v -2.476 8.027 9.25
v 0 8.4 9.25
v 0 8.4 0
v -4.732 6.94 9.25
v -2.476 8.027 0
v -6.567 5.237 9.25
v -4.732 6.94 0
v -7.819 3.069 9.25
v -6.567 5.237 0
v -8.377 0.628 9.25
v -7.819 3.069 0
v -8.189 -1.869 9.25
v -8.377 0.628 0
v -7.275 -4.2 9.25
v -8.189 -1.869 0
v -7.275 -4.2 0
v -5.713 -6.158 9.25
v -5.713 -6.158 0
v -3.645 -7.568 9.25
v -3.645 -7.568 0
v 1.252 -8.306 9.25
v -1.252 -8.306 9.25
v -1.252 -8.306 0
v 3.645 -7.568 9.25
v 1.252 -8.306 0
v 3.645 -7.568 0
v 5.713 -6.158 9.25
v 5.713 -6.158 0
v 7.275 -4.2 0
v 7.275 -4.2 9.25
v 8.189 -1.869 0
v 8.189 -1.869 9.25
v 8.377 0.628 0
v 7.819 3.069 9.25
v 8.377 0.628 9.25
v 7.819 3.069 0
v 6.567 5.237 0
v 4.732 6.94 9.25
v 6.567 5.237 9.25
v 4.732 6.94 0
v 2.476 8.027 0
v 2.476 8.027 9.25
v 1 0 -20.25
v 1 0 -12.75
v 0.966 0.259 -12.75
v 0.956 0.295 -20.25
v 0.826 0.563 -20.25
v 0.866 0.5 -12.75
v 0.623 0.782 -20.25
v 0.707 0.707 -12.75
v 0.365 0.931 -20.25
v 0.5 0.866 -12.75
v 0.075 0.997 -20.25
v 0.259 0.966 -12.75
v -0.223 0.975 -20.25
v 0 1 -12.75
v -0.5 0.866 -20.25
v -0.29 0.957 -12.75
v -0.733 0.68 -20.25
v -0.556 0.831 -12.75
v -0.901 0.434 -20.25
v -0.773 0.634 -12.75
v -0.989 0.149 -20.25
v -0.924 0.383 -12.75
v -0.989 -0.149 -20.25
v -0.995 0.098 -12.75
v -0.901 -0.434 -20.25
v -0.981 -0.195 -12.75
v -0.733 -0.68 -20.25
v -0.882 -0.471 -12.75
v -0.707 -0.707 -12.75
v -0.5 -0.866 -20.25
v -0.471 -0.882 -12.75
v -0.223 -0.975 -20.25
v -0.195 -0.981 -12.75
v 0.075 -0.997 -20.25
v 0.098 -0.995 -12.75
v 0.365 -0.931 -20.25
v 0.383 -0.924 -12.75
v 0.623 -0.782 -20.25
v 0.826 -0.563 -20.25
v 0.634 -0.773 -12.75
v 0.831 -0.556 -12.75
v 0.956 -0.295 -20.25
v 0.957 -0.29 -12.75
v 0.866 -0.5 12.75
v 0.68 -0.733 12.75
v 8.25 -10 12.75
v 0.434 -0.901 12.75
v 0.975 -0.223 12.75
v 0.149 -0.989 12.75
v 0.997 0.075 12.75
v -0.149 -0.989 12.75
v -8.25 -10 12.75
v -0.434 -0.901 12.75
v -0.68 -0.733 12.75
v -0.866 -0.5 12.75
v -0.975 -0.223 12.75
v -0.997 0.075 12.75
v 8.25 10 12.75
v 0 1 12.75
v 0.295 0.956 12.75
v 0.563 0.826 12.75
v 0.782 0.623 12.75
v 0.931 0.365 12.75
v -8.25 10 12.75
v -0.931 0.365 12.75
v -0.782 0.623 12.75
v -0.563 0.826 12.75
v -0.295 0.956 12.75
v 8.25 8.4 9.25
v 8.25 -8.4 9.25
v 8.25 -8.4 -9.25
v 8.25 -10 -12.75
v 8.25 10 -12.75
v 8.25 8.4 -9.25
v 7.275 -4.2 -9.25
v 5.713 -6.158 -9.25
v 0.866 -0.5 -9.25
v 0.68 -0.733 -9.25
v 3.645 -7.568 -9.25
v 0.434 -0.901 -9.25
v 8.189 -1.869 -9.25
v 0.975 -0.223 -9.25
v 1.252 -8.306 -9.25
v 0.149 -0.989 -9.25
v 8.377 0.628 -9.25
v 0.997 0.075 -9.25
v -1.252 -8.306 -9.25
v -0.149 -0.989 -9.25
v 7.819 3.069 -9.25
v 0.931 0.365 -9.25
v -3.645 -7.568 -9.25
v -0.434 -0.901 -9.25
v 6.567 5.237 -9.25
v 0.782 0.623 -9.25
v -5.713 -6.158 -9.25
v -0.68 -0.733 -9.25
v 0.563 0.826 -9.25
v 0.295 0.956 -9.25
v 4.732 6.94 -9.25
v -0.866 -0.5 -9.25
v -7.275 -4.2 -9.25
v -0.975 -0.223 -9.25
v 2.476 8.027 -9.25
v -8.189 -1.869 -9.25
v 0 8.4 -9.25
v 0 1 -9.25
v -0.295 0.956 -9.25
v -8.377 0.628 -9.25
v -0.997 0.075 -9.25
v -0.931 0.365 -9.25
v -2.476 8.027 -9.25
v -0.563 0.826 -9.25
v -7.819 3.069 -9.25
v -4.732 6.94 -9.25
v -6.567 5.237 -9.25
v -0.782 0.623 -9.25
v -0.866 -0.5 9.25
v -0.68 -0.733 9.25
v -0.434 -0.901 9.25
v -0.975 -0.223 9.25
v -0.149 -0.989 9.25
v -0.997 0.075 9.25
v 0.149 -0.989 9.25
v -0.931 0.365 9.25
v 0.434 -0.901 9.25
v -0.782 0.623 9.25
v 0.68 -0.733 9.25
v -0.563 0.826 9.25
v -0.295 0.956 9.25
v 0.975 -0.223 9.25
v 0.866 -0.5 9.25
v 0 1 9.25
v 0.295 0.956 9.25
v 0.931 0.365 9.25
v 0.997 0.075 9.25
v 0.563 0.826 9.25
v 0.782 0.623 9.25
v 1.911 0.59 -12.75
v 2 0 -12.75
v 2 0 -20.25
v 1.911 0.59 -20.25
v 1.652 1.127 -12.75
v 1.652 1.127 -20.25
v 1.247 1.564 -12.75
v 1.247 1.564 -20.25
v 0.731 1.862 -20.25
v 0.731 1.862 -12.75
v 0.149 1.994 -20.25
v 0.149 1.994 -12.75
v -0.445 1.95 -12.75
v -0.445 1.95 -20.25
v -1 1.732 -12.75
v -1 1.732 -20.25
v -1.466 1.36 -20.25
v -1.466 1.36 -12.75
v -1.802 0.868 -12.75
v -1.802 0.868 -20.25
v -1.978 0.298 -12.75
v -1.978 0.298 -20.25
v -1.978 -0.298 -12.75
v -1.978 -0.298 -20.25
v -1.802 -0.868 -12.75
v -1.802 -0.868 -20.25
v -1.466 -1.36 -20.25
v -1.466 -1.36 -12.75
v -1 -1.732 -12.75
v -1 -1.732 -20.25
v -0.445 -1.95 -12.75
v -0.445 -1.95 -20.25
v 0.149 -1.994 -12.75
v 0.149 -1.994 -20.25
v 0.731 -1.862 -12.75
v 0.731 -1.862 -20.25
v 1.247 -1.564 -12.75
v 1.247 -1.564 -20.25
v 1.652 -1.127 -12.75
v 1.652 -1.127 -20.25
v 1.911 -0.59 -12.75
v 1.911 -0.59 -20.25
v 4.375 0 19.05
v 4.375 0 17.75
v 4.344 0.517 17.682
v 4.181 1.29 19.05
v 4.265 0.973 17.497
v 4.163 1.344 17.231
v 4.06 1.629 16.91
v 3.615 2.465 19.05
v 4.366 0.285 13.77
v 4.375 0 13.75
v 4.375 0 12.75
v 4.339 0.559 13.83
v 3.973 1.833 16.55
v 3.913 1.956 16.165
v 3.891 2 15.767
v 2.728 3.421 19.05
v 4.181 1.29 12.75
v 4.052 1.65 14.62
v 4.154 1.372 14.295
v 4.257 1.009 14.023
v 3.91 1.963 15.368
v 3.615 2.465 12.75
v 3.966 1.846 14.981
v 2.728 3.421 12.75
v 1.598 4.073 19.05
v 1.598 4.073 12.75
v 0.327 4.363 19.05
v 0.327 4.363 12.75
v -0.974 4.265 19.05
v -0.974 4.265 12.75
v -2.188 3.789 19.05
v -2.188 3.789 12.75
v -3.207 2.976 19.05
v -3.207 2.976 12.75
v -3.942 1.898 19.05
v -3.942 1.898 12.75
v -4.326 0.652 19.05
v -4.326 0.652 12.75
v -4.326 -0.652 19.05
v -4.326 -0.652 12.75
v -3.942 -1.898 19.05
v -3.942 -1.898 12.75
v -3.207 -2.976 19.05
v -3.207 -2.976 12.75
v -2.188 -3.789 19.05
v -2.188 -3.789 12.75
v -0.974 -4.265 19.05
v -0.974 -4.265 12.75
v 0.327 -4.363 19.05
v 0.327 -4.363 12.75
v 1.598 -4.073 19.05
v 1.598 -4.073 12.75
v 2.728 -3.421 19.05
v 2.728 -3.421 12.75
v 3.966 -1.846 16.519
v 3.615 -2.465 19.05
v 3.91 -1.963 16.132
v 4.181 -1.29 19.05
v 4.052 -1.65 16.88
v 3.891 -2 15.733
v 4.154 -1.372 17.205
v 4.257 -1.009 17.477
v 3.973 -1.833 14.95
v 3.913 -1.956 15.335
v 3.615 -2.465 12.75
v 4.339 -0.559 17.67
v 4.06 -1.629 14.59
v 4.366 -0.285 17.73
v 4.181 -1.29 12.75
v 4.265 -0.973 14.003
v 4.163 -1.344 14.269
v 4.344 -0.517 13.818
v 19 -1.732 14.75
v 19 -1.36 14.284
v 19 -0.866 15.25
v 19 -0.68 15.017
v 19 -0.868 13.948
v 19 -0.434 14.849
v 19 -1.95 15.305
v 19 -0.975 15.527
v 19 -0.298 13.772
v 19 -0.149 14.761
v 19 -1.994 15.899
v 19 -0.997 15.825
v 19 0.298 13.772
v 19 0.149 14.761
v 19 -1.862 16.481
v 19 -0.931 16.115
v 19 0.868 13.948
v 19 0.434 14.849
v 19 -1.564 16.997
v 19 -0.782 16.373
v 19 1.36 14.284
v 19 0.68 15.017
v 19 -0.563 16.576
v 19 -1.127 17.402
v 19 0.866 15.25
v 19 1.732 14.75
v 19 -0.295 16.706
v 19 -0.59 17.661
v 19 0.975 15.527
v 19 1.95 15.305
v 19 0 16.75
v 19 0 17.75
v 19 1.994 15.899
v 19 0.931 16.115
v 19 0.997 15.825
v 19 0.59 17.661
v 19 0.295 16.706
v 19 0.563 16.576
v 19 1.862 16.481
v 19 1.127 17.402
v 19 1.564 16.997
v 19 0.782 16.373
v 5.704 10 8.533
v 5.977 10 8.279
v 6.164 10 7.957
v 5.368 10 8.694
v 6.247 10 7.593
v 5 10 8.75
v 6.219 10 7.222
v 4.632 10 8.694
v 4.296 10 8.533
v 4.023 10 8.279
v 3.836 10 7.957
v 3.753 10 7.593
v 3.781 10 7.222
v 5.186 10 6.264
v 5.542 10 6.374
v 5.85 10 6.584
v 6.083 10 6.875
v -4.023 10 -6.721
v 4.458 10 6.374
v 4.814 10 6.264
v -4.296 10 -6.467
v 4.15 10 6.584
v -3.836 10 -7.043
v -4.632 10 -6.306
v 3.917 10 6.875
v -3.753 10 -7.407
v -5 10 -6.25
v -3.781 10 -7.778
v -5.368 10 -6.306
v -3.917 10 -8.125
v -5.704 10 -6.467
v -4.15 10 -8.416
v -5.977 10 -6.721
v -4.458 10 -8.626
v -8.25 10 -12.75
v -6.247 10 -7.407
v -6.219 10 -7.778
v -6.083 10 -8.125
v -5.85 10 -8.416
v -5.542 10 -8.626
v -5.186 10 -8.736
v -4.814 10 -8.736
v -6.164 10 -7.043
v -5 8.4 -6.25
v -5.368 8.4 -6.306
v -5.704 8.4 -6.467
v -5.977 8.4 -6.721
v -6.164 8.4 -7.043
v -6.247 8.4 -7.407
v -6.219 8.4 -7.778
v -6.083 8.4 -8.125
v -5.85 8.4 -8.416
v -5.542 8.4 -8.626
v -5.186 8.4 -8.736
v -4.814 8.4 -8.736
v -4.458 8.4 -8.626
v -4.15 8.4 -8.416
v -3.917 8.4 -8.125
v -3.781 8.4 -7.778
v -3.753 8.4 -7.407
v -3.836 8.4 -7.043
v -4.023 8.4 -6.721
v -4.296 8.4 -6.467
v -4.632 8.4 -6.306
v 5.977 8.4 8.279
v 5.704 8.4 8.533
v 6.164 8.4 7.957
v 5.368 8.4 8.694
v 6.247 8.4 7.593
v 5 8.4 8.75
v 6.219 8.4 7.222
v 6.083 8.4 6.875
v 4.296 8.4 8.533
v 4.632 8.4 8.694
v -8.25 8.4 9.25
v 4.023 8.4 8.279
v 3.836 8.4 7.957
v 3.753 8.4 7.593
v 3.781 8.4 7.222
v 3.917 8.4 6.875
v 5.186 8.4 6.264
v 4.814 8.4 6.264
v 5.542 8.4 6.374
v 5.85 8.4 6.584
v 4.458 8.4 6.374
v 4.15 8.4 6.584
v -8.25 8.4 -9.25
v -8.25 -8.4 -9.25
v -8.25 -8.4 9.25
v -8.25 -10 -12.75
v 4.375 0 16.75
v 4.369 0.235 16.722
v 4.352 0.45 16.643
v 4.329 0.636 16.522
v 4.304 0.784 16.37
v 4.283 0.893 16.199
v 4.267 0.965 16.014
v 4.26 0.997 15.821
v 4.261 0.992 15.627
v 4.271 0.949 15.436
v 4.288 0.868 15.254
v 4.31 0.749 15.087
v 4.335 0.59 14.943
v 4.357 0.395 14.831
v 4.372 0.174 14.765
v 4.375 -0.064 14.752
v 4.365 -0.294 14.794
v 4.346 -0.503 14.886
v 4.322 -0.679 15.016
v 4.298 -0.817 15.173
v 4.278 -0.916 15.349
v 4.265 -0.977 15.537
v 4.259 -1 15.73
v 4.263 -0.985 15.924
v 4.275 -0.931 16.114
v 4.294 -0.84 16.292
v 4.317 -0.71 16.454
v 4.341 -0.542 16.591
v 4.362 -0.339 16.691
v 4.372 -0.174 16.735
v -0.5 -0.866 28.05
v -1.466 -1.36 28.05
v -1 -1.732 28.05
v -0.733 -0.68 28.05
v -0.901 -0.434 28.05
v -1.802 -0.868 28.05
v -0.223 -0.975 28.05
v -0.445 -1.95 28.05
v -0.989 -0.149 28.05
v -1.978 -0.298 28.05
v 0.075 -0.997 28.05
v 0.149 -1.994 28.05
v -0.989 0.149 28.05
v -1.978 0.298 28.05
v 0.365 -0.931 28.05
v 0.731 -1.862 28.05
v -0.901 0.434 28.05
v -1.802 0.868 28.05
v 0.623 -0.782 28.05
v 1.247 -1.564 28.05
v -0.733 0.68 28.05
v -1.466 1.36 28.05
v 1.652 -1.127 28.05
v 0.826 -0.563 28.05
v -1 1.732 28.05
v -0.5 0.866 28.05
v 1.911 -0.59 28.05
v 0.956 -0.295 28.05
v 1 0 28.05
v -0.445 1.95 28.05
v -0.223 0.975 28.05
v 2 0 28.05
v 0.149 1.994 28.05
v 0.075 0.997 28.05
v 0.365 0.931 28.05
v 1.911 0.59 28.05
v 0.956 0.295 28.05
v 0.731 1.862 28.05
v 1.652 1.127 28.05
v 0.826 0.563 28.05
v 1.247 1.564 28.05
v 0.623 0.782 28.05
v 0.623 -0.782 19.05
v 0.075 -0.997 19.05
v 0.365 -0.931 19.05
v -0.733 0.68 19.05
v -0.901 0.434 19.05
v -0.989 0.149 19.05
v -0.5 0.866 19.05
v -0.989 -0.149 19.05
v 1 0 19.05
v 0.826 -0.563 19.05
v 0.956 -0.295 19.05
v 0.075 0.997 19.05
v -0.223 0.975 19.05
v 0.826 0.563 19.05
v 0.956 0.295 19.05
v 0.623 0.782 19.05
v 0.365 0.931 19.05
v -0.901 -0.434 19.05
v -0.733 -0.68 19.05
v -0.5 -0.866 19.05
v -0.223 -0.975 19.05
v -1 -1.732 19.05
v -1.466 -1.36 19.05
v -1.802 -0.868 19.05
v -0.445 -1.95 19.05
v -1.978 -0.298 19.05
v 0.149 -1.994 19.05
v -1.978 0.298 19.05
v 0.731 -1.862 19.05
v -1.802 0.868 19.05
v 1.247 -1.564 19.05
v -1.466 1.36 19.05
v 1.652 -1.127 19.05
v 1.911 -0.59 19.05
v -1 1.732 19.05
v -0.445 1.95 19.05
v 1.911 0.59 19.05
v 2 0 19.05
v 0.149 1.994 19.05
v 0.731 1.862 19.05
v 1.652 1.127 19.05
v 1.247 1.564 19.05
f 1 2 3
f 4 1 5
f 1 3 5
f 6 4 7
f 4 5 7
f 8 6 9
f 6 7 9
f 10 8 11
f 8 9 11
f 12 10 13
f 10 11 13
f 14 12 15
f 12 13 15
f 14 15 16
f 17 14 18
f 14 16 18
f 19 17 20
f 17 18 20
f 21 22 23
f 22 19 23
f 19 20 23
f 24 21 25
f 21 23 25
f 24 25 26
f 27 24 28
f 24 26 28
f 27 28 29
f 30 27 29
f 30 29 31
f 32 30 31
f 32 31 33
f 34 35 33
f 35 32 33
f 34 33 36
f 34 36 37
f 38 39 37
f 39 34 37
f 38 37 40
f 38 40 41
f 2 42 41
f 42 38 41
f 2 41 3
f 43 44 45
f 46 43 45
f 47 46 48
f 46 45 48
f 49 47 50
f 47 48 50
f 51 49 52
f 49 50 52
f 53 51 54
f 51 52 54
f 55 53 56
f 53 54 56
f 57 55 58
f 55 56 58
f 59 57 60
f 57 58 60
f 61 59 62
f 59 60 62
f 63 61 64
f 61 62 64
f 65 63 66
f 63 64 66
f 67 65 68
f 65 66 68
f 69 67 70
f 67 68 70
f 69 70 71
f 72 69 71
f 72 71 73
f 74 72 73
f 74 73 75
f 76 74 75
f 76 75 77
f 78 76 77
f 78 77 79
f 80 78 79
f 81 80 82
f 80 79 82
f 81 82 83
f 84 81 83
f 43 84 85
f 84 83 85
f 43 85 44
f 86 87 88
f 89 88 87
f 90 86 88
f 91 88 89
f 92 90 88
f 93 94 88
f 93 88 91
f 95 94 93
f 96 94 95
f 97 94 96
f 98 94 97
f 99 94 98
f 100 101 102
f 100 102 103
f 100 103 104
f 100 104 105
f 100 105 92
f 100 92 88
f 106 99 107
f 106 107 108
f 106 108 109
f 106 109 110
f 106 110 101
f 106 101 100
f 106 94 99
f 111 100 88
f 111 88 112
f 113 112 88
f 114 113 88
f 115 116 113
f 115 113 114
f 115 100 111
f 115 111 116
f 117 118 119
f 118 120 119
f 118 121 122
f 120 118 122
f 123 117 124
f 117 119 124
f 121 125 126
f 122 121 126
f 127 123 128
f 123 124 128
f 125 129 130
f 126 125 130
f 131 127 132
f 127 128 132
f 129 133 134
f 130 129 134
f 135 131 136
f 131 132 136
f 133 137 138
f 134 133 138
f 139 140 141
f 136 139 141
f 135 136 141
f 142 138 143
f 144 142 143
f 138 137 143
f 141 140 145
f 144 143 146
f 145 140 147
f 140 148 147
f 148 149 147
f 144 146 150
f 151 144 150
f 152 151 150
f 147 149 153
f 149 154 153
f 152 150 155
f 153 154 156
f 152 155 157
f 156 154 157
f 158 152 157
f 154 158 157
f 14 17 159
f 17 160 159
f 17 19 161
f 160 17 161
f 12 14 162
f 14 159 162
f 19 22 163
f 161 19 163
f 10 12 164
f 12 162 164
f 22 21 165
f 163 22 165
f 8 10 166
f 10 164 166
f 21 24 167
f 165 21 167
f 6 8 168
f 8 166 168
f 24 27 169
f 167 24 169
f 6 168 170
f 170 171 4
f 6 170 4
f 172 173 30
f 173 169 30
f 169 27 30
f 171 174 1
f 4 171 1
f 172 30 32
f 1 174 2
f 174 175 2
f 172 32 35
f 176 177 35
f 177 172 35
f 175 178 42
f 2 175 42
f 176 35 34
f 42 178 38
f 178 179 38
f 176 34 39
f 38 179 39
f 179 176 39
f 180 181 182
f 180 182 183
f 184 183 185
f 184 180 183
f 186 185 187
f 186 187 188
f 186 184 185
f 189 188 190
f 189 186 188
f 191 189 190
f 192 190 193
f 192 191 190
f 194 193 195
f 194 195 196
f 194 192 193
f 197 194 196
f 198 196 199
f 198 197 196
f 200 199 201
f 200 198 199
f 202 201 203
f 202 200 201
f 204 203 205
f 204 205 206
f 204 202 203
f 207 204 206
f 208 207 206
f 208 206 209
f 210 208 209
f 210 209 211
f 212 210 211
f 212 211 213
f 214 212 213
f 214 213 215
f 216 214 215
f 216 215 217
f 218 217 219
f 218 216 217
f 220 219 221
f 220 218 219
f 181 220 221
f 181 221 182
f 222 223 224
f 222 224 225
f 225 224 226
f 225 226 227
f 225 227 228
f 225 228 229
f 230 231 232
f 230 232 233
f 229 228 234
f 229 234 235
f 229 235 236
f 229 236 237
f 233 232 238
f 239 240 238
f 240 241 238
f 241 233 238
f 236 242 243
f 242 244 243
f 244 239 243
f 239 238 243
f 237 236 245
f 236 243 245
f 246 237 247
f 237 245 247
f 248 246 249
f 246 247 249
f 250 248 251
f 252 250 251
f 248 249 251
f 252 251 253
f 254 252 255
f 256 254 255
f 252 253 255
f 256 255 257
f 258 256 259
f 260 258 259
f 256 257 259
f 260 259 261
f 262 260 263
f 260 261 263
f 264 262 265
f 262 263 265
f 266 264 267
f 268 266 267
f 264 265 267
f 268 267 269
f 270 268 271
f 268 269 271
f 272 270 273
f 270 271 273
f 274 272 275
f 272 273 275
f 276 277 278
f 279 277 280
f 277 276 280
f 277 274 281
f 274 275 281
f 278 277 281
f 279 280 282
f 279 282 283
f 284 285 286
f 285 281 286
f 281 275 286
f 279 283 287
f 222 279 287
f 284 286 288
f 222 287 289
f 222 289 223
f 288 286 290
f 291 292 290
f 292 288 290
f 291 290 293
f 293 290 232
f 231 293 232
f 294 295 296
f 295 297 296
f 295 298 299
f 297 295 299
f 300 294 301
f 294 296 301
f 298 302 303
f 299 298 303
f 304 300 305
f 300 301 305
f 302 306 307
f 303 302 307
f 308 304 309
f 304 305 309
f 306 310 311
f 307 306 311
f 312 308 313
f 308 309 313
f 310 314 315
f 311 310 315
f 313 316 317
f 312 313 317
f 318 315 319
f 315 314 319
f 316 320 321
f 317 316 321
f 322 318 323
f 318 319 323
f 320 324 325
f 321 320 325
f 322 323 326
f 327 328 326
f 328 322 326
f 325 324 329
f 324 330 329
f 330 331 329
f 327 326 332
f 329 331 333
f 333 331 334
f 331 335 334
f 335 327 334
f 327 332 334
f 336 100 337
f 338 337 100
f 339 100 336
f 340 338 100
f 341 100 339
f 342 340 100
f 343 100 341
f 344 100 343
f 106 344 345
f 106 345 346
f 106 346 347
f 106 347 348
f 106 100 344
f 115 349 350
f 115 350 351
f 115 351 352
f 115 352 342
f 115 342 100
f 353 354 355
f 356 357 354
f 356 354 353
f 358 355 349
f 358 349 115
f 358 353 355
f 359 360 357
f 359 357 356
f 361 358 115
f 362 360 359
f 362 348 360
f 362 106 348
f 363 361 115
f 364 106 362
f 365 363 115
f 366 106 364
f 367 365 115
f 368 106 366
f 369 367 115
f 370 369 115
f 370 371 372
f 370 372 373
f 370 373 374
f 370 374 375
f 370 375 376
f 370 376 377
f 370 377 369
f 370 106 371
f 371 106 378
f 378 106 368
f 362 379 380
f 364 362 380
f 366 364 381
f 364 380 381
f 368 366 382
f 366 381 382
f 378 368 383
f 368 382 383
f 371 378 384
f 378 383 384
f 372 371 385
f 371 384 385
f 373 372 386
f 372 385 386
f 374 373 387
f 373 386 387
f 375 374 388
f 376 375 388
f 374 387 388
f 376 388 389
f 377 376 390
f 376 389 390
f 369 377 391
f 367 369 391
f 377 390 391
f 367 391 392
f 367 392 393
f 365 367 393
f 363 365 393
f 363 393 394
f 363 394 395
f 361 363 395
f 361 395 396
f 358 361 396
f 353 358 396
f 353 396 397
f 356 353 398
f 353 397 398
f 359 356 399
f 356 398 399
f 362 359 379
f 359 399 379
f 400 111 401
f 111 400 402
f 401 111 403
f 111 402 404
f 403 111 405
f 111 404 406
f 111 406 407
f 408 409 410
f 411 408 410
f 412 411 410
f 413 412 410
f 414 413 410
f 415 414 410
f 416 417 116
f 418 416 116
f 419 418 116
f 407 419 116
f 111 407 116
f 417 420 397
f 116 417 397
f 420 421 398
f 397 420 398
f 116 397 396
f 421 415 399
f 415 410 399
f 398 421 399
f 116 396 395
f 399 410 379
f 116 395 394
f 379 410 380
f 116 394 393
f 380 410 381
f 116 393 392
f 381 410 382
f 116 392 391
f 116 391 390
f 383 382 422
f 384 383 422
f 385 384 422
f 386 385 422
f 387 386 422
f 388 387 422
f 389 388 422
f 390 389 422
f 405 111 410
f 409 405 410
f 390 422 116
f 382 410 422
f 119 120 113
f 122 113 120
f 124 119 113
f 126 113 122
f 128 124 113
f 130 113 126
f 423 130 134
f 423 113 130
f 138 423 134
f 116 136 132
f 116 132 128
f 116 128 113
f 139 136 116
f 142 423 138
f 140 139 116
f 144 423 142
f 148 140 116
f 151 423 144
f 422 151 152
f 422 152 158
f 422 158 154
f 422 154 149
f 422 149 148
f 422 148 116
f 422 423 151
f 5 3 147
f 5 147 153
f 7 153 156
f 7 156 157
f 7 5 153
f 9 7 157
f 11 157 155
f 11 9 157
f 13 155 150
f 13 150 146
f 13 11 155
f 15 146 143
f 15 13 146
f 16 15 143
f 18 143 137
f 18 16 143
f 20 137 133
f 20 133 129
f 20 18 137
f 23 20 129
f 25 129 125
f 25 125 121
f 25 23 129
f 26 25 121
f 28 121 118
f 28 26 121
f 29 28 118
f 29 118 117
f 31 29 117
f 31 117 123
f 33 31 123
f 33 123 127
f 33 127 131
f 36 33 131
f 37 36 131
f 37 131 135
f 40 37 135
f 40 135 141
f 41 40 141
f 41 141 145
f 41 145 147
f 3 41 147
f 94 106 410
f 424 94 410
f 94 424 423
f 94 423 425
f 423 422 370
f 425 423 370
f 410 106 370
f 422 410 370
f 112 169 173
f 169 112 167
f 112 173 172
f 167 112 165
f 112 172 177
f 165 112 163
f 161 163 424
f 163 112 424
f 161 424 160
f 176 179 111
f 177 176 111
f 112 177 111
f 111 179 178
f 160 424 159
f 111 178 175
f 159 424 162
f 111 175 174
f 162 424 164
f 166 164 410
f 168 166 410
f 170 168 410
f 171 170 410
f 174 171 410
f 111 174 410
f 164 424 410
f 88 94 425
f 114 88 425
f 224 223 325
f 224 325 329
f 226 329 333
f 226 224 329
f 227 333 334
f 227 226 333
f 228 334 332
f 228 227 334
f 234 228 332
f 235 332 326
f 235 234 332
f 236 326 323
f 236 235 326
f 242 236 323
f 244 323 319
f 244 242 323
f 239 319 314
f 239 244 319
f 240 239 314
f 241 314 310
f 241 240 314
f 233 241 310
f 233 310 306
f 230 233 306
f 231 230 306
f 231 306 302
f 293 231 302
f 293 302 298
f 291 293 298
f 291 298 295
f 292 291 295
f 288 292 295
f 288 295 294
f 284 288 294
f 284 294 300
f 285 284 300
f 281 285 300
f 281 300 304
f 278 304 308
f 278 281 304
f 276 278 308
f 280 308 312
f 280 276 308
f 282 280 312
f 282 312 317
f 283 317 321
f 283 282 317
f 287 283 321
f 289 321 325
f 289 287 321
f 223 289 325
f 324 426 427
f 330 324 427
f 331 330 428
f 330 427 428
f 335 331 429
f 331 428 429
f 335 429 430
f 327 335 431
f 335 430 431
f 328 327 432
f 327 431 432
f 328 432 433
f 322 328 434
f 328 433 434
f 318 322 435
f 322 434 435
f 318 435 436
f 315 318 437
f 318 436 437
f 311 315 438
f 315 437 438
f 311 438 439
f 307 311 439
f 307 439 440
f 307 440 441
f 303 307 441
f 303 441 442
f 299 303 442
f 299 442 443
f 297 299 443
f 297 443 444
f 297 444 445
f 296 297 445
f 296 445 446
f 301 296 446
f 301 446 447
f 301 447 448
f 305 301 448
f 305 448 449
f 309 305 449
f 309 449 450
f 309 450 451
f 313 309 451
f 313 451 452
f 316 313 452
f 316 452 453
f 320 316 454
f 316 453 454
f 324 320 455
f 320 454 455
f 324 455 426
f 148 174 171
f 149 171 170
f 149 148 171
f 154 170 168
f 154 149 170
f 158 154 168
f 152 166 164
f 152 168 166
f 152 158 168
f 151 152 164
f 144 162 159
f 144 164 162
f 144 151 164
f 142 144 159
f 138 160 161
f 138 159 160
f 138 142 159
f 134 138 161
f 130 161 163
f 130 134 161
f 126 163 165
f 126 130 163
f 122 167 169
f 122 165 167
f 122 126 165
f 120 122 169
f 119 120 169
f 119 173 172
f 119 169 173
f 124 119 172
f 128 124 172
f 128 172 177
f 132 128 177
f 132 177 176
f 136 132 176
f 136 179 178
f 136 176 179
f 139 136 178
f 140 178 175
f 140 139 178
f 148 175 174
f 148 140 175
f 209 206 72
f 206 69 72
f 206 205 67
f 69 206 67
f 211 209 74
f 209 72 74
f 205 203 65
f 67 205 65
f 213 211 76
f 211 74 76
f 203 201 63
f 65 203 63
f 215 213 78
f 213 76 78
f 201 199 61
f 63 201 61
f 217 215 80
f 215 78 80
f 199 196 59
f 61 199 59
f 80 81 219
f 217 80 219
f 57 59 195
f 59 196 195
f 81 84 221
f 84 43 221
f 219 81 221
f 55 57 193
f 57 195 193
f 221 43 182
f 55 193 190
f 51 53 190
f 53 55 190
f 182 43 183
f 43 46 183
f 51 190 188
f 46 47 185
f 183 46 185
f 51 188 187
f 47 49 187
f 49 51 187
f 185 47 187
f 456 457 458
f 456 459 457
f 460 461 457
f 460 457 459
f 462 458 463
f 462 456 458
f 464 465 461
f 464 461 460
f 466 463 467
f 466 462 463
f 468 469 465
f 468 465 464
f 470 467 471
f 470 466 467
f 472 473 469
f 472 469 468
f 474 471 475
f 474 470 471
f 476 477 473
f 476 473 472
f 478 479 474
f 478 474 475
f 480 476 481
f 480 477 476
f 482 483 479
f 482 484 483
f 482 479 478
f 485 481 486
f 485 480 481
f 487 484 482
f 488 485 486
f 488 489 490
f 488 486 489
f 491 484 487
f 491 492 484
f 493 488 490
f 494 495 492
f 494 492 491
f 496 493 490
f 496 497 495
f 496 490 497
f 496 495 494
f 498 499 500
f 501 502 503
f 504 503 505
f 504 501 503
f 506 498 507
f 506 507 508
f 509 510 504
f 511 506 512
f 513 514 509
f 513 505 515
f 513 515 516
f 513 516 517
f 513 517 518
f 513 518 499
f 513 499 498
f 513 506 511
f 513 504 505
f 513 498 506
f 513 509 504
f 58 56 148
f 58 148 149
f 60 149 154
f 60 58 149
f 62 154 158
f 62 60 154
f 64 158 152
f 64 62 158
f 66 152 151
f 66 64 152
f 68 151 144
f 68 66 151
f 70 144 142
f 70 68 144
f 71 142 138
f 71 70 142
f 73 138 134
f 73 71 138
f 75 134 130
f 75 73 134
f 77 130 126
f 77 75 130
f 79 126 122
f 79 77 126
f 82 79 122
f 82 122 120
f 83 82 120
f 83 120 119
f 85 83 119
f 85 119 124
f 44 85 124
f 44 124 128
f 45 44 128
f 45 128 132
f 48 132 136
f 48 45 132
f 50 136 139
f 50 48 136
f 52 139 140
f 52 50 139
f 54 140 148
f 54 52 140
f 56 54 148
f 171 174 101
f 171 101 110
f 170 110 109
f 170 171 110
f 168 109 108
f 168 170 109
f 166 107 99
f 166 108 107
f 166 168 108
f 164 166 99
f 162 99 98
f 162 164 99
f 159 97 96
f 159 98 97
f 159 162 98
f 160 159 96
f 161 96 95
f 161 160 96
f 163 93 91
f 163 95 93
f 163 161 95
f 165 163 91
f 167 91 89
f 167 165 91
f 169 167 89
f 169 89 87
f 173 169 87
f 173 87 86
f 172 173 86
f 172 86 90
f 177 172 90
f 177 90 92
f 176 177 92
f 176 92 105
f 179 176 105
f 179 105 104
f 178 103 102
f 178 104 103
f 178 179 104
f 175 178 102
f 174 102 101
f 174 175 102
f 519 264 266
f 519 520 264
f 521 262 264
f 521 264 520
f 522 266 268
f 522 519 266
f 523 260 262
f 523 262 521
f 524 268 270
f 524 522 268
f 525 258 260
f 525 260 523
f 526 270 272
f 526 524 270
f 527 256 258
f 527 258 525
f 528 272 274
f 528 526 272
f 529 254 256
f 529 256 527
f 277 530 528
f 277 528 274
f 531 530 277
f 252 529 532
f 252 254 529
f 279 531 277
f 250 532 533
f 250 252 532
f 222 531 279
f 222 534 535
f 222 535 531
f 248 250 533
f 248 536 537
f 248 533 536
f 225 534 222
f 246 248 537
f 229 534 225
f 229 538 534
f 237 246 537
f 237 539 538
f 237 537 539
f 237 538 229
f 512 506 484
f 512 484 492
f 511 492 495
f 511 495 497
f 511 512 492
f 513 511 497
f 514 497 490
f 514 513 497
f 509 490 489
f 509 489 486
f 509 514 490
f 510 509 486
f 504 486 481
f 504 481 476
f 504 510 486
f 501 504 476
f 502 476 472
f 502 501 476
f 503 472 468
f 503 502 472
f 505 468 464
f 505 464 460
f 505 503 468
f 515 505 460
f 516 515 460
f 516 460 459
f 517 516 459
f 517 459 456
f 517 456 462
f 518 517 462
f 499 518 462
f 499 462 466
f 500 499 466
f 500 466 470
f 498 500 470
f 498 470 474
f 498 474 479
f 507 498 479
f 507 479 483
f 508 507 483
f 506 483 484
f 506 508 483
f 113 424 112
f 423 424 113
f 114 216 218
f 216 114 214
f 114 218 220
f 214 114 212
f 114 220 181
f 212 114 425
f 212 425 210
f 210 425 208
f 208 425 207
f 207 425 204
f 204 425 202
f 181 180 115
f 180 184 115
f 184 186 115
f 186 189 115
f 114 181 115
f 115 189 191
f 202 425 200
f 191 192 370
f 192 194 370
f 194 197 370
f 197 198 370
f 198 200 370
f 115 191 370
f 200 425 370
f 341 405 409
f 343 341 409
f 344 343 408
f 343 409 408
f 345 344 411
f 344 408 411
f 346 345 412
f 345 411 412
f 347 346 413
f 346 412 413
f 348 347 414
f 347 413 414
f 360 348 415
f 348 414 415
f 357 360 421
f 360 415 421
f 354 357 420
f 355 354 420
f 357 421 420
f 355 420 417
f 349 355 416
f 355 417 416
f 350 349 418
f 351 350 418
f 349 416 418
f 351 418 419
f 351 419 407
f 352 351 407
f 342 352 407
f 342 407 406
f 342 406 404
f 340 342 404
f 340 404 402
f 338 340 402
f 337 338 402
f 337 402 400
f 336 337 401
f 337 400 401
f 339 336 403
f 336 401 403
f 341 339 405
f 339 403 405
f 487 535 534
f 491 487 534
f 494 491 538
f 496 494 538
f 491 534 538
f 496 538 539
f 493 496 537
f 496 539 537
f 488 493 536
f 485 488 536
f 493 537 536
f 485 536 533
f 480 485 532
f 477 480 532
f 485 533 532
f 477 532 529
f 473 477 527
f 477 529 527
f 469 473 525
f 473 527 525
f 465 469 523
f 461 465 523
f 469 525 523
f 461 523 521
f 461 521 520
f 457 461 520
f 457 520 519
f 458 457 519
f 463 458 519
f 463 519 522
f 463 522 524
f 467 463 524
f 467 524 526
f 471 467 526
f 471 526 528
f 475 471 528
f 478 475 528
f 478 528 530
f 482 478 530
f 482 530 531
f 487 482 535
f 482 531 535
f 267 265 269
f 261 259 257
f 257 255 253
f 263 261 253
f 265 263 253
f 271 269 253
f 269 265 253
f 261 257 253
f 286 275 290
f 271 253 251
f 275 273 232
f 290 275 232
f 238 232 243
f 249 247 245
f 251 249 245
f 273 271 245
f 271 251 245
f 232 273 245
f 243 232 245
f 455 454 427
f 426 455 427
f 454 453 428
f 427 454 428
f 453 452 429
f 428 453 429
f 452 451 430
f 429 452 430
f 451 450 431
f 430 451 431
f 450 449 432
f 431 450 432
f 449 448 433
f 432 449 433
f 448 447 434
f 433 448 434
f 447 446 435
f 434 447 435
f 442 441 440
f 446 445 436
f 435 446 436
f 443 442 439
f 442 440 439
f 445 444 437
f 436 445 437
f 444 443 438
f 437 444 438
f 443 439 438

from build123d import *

# Parameters (mm, degrees)
FRAME_EXTRUDE_DEPTH                     = 8.25
FRAME_EXTRUDE_DEPTH_BACK                = 8.25
FRAME_SKETCH_W                          = 25.5
FRAME_SKETCH_H                          = 20
FRAME_SKETCH_W_2                        = 18.5
FRAME_SKETCH_H_2                        = 16.8
ELECTROMAGNET_EXTRUDE_REACH             = 20.183
ELECTROMAGNET_SKETCH_R                  = 8.4
ELECTROMAGNET_EXTRUDE_DIRECTION_2_REACH = 20.183
PORT_3_SKETCH_R                         = 2
PORT_3_SKETCH_R_2                       = 1
PORT_3_EXTRUDE_DEPTH                    = 7.5
PORT_3_SKETCH_3_R                       = 1
CENTER_HOLE_CUT_DEPTH                   = 29.649781849
BASE_OF_PORTS_1_2_SKETCH_R              = 4.375
BASE_OF_PORT_1_2_PORTS_DEPTH            = 6.3
PORT_2_SKETCH_R                         = 2
PORT_2_SKETCH_R_2                       = 1
PORT_2_EXTRUDE_DEPTH                    = 9
PORTS_1_SKETCH_R                        = 2
PORTS_1_SKETCH_R_2                      = 1
PORTS_1_EXTRUDE_DEPTH                   = 19
MOUNTING_HOLES_PROFILE_SKETCH_W         = 1.25
MOUNTING_HOLES_PROFILE_SKETCH_H         = 3.250185188
MOUNTING_HOLES_AT_2_COUNT               = 2
MOUNTING_HOLES_AT_2_PITCH               = 18.027756377


with BuildPart() as part:
    # Frame Sketch → Frame Extrude (new, two sides: drawn at the far end of the back side and taken through both)
    with BuildSketch(Plane(origin=(0, 0, 0), x_dir=(0, 0, -1), z_dir=(1, 0, 0)).offset(-FRAME_EXTRUDE_DEPTH_BACK)):
        Rectangle(FRAME_SKETCH_W, FRAME_SKETCH_H)
        Rectangle(FRAME_SKETCH_W_2, FRAME_SKETCH_H_2, mode=Mode.SUBTRACT)
    extrude(amount=FRAME_EXTRUDE_DEPTH + FRAME_EXTRUDE_DEPTH_BACK)


with BuildPart() as body_2:

    # Electromagnet Extrude: up to this face of the body (flat: up to its plane)
    electromagnet_extrude_end = Plane(part.part.faces().sort_by_distance((0, 0, 9.25))[0])
    # Electromagnet Sketch → Electromagnet Extrude (new, up to the picked face)
    with BuildSketch(Plane.XY, mode=Mode.PRIVATE) as electromagnet_extrude_sk1:
        with Locations(Location((0, 0, 0), (0, 0, 90))):
            Circle(ELECTROMAGNET_SKETCH_R)
    electromagnet_extrude_tool1 = split(extrude(electromagnet_extrude_sk1.sketch, amount=ELECTROMAGNET_EXTRUDE_REACH, mode=Mode.PRIVATE), bisect_by=electromagnet_extrude_end, keep=Keep.BOTH, mode=Mode.PRIVATE)
    add(electromagnet_extrude_tool1.solids().sort_by(Axis((0, 0, 0), (0, 0, 1)))[0])


    # Electromagnet Extrude direction 2: up to this face of the body (flat: up to its plane)
    electromagnet_extrude_direction_2_end = Plane(part.part.faces().sort_by_distance((0, 0, -9.25))[0])
    # Electromagnet Sketch → Electromagnet Extrude direction 2 (add, up to the picked face)
    with BuildSketch(Plane.XY, mode=Mode.PRIVATE) as electromagnet_extrude_direction_2_sk1:
        with Locations(Location((0, 0, 0), (0, 0, 90))):
            Circle(ELECTROMAGNET_SKETCH_R)
    electromagnet_extrude_direction_2_tool1 = split(extrude(electromagnet_extrude_direction_2_sk1.sketch, amount=-ELECTROMAGNET_EXTRUDE_DIRECTION_2_REACH, mode=Mode.PRIVATE), bisect_by=electromagnet_extrude_direction_2_end, keep=Keep.BOTH, mode=Mode.PRIVATE)
    add(electromagnet_extrude_direction_2_tool1.solids().sort_by(Axis((0, 0, 0), (0, 0, -1)))[0])


with BuildPart() as part_1:
    add(part.part)

    # Port 3 Sketch → Port 3 Extrude (add)
    with BuildSketch(Plane.XY.offset(-12.75)):
        Circle(PORT_3_SKETCH_R)
        Circle(PORT_3_SKETCH_R_2, mode=Mode.SUBTRACT)
    extrude(amount=-PORT_3_EXTRUDE_DEPTH)


with BuildPart() as center_hole_cut_tool:
    # Port 3 Sketch<3> → Center Hole Cut (new, through all)
    with BuildSketch(Plane.XY.offset(-12.75)):
        with Locations(Location((0, 0, 0), (0, 0, 90))):
            Circle(PORT_3_SKETCH_3_R)
    extrude(amount=CENTER_HOLE_CUT_DEPTH)


with BuildPart() as part_2:
    add(part_1.part)

    # Center Hole Cut: cut by center_hole_cut_tool
    add(center_hole_cut_tool.part, mode=Mode.SUBTRACT)

    # Mounting Holes Profile Sketch → Mounting Holes (revolve, cut)
    with BuildSketch(Plane(origin=(5, 10, 7.5), x_dir=(0, 0, 1), z_dir=(1, 0, 0))):
        with Locations((0.625, 1.625092594)):
            Rectangle(MOUNTING_HOLES_PROFILE_SKETCH_W, MOUNTING_HOLES_PROFILE_SKETCH_H)
    mounting_holes = revolve(axis=Axis((5, 16.35, 7.5), (0, -1, 0)), mode=Mode.SUBTRACT)

    # Mounting Holes at 2: Mounting Holes ×2
    with Locations(*[Vector(-0.5547001962252294, 0, -0.8320502943378435) * (i * MOUNTING_HOLES_AT_2_PITCH) for i in range(1, MOUNTING_HOLES_AT_2_COUNT)]):
        add(mounting_holes, mode=Mode.SUBTRACT)


with BuildPart() as body_2_1:
    add(body_2.part)

    # Center Hole Cut: cut by center_hole_cut_tool
    add(center_hole_cut_tool.part, mode=Mode.SUBTRACT)


with BuildPart() as body_3:
    # Base of Ports 1&2 Sketch → Base of Port 1&2 Ports (new body)
    with BuildSketch(Plane.XY.offset(12.75)):
        Circle(BASE_OF_PORTS_1_2_SKETCH_R)
    extrude(amount=BASE_OF_PORT_1_2_PORTS_DEPTH)

    # Port 2 Sketch → Port 2 Extrude (add)
    with BuildSketch(Plane.XY.offset(19.05)):
        Circle(PORT_2_SKETCH_R)
        Circle(PORT_2_SKETCH_R_2, mode=Mode.SUBTRACT)
    extrude(amount=PORT_2_EXTRUDE_DEPTH)

    # Ports 1 Sketch → Ports 1 Extrude (add)
    with BuildSketch(Plane(origin=(0, 2.609545443, 0), x_dir=(0, 0, -1), z_dir=(-1, 0, 0))):
        with Locations(Location((-15.75, 2.609545443, 0), (0, 0, 180))):
            Circle(PORTS_1_SKETCH_R)
        with Locations(Location((-15.75, 2.609545443, 0), (0, 0, 180))):
            Circle(PORTS_1_SKETCH_R_2, mode=Mode.SUBTRACT)
    extrude(amount=-PORTS_1_EXTRUDE_DEPTH)


solid = Compound([part_2.part, body_2_1.part, body_3.part])
